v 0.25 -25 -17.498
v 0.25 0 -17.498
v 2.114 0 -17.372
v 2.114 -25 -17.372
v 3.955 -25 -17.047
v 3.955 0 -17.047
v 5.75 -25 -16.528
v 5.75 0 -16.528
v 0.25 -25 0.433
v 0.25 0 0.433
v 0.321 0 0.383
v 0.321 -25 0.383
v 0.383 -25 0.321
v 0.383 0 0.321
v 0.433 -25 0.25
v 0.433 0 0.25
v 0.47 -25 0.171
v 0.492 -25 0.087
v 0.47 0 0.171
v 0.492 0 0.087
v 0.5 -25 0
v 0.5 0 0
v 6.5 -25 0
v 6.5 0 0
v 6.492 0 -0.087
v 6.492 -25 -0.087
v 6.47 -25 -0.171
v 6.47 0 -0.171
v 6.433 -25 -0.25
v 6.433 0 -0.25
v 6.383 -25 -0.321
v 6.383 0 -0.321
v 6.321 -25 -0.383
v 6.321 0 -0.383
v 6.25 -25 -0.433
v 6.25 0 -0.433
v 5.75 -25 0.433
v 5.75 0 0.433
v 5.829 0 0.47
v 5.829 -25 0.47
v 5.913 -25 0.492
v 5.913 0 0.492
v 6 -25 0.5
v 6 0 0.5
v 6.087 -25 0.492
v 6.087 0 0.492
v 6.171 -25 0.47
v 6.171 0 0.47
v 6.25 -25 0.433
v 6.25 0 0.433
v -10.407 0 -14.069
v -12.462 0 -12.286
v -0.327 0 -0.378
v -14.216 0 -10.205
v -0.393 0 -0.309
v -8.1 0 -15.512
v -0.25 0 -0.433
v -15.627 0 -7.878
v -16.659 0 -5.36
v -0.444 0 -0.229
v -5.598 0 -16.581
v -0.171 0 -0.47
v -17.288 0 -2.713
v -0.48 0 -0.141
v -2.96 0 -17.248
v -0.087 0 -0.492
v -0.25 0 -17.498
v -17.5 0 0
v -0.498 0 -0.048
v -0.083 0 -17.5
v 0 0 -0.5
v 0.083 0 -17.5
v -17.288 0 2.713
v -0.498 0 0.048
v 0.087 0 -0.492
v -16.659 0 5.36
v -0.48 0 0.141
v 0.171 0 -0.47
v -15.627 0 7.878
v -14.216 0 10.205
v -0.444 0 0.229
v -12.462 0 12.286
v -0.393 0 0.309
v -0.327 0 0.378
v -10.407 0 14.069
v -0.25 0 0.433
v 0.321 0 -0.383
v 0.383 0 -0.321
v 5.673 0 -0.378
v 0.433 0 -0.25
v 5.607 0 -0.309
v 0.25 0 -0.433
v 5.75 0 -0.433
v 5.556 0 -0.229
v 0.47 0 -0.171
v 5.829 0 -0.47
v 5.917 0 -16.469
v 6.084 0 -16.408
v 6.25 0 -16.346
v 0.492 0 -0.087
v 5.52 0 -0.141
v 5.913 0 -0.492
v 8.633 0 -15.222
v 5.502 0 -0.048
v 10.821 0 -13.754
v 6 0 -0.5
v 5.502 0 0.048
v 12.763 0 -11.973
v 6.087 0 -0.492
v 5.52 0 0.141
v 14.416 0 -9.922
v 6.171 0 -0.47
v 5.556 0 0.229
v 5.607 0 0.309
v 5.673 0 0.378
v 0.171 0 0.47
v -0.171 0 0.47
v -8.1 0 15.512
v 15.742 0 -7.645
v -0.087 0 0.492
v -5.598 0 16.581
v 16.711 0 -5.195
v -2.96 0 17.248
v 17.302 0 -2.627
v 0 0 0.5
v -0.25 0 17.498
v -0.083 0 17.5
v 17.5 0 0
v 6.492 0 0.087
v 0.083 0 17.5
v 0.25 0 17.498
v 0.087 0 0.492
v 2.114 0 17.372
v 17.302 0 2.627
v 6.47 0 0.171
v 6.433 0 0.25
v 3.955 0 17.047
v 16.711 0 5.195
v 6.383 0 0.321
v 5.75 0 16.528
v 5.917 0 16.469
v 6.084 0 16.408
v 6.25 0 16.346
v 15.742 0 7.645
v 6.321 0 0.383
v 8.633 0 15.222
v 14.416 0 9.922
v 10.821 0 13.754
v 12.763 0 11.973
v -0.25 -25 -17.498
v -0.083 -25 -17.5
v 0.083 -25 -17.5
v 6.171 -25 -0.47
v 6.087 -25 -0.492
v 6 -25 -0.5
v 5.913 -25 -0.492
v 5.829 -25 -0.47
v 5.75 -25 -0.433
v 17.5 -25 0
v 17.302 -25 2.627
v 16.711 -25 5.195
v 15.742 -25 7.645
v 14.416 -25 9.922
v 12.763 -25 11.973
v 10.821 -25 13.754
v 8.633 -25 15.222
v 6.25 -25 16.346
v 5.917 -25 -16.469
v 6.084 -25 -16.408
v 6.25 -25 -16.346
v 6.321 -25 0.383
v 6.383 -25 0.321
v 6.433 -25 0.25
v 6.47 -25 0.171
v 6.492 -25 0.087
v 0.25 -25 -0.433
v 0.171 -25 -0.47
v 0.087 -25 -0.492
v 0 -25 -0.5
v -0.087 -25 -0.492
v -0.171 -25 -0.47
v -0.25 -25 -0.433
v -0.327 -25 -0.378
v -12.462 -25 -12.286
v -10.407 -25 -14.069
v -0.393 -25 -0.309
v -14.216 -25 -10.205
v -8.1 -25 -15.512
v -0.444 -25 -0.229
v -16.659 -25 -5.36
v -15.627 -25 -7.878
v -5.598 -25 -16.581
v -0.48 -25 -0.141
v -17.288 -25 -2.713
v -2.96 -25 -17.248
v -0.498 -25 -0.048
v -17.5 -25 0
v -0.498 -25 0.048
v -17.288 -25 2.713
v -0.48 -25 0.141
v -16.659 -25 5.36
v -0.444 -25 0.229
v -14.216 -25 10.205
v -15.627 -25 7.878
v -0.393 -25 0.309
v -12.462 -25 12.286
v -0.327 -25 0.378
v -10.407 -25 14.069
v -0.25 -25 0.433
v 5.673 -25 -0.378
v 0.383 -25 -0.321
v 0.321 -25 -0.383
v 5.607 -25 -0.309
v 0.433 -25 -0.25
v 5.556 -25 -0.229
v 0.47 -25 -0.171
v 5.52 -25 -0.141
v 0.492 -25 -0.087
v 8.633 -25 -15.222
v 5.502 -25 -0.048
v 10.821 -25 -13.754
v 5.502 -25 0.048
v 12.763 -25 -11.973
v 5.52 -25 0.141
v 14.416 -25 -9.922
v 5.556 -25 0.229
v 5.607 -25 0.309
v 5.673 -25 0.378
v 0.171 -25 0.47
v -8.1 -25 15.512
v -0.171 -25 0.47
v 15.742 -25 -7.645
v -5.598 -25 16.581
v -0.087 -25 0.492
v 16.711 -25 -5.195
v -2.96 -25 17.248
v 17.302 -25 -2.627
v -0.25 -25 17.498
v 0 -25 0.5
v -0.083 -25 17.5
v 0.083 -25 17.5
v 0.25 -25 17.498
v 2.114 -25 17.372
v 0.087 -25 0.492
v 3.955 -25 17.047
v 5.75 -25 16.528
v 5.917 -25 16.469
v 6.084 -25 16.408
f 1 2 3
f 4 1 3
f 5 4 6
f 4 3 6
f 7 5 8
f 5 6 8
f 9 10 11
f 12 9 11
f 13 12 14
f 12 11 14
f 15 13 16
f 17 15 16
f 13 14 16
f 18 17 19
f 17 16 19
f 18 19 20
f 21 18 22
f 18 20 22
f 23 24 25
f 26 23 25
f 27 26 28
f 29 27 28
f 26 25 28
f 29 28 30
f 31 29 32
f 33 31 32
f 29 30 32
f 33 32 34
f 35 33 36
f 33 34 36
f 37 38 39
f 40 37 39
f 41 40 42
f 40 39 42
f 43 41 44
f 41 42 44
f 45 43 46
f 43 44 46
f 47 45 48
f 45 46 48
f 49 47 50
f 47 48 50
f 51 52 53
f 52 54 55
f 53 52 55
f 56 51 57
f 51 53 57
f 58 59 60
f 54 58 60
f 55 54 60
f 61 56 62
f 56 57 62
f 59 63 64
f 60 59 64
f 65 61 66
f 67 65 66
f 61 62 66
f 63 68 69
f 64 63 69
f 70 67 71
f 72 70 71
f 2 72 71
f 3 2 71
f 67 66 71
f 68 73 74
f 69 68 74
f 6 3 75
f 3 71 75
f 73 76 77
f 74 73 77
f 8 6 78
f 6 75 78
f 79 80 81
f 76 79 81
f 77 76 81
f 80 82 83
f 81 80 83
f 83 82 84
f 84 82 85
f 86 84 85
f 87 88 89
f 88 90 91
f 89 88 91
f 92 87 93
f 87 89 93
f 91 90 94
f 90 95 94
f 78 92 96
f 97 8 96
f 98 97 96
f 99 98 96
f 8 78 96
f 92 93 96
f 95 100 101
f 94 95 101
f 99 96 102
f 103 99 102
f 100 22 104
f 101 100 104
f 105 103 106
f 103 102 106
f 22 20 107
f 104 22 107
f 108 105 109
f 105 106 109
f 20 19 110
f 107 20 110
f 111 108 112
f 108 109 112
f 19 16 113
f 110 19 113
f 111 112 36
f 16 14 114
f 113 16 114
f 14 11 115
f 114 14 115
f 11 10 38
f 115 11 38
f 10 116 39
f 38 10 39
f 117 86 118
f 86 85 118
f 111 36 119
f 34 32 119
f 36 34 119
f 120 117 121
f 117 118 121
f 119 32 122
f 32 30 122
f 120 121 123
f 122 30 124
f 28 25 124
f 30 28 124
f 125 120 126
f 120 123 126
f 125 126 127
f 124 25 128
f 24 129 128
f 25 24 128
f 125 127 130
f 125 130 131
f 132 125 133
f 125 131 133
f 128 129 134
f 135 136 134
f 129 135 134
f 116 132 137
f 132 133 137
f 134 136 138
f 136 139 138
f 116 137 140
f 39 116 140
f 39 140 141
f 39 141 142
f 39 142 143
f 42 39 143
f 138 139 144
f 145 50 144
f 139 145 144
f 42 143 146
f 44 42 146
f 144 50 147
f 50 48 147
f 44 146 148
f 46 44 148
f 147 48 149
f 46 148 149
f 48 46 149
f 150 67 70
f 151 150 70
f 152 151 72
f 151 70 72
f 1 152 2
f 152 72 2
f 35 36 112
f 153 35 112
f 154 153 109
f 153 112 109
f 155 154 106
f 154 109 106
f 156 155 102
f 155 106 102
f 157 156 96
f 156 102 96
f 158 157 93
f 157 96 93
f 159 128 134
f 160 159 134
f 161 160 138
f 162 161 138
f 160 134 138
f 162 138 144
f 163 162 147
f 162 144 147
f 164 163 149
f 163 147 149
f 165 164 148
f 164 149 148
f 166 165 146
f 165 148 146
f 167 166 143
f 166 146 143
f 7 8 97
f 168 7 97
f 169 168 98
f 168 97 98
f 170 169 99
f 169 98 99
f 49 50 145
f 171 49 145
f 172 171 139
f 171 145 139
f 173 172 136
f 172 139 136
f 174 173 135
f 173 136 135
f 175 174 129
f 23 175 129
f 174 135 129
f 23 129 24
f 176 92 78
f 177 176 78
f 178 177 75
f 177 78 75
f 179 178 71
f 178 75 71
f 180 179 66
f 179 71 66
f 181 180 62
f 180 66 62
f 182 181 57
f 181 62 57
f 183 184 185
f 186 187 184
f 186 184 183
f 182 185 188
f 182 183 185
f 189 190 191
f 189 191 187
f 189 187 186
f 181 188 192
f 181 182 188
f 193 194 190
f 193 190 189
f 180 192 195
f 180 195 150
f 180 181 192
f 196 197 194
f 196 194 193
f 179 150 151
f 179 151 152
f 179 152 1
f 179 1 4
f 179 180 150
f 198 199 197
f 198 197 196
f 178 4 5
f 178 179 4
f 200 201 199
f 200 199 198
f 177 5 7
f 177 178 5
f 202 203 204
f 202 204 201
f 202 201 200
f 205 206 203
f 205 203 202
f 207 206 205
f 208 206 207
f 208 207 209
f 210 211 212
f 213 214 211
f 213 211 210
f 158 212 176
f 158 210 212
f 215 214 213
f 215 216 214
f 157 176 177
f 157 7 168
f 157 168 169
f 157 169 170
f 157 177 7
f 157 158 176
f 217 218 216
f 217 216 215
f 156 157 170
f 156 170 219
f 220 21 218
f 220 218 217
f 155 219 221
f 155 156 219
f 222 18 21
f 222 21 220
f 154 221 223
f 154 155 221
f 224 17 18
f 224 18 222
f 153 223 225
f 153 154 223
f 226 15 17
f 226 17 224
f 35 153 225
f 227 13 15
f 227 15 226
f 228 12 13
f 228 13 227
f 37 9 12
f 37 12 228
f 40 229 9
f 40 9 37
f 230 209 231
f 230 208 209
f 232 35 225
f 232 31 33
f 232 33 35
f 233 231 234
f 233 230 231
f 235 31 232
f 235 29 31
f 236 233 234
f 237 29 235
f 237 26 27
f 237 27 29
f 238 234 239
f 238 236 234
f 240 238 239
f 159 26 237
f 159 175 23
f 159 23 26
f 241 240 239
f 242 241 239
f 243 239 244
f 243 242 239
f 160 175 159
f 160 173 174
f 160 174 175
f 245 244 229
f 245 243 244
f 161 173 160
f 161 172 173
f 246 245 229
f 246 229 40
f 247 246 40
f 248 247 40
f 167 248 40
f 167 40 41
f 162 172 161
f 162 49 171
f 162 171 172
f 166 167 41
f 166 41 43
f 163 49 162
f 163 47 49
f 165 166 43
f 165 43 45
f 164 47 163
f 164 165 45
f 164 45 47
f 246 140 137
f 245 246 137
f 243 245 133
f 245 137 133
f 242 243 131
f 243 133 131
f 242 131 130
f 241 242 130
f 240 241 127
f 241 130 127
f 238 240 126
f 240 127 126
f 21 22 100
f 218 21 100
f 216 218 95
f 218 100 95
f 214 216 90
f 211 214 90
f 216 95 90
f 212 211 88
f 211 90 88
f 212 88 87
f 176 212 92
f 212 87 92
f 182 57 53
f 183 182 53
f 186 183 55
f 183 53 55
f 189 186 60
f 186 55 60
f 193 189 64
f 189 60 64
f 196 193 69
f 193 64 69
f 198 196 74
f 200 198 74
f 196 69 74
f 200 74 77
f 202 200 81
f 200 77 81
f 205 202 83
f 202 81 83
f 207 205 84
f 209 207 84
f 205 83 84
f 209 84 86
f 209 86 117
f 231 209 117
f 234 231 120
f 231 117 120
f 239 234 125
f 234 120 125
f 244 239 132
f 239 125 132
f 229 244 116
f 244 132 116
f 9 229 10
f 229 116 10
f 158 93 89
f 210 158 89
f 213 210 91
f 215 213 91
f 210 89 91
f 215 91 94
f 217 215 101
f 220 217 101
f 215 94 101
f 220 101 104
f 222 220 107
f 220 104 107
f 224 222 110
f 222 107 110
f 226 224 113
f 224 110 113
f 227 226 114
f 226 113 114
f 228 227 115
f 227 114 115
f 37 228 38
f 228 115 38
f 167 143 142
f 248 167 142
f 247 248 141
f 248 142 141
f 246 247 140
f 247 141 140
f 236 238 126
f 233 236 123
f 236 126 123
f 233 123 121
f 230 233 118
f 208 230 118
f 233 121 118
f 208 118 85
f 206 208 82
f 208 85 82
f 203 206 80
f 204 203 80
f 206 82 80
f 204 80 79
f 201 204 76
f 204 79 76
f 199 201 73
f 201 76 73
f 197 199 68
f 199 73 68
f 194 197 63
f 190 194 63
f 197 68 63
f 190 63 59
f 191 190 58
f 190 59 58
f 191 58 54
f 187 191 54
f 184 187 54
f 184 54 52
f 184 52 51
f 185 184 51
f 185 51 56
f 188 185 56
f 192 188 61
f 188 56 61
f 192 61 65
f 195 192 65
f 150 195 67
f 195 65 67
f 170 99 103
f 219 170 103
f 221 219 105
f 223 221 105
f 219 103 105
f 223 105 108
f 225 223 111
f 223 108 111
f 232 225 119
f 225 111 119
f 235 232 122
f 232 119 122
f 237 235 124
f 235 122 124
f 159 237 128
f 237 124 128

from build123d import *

# Parameters (mm, degrees)
F1_DEPTH = 25


with BuildPart() as f1:
    # F0 (on Front) → F1 (new body)
    with BuildSketch(Plane.XZ):
        with BuildLine():
            Line((-0.25, 0.4330127019), (-0.25, 17.4982141946))
            ThreePointArc((-0.25, 17.4982141946), (-17.5, 0), (-0.25, -17.4982141946))
            Line((-0.25, -17.4982141946), (-0.25, -0.4330127019))
            ThreePointArc((-0.25, -0.4330127019), (-0.5, 0), (-0.25, 0.4330127019))
        make_face()
        with BuildLine():
            Line((5.75, 0.4330127019), (5.75, 16.5283846761))
            ThreePointArc((5.75, 16.5283846761), (3.0389376966, 17.2341189991), (0.25, 17.4982141946))
            Line((0.25, 17.4982141946), (0.25, 0.4330127019))
            ThreePointArc((0.25, 0.4330127019), (0.4330127019, 0.25), (0.5, 0))
            ThreePointArc((0.5, 0), (0.4330127019, -0.25), (0.25, -0.4330127019))
            Line((0.25, -0.4330127019), (0.25, -17.4982141946))
            ThreePointArc((0.25, -17.4982141946), (3.0389376966, -17.2341189991), (5.75, -16.5283846761))
            Line((5.75, -16.5283846761), (5.75, -0.4330127019))
            ThreePointArc((5.75, -0.4330127019), (5.5, 0), (5.75, 0.4330127019))
        make_face()
        with BuildLine():
            Line((0.25, 0.4330127019), (0.25, 17.4982141946))
            ThreePointArc((0.25, 17.4982141946), (0, 17.5), (-0.25, 17.4982141946))
            Line((-0.25, 17.4982141946), (-0.25, 0.4330127019))
            ThreePointArc((-0.25, 0.4330127019), (0, 0.5), (0.25, 0.4330127019))
        make_face()
        with BuildLine():
            ThreePointArc((-0.25, -17.4982141946), (0, -17.5), (0.25, -17.4982141946))
            Line((0.25, -17.4982141946), (0.25, -0.4330127019))
            ThreePointArc((0.25, -0.4330127019), (0, -0.5), (-0.25, -0.4330127019))
            Line((-0.25, -0.4330127019), (-0.25, -17.4982141946))
        make_face()
        with BuildLine():
            ThreePointArc((5.75, -16.5283846761), (6.0006939438, -16.439028931), (6.25, -16.3458710383))
            Line((6.25, -16.3458710383), (6.25, -0.4330127019))
            ThreePointArc((6.25, -0.4330127019), (6, -0.5), (5.75, -0.4330127019))
            Line((5.75, -0.4330127019), (5.75, -16.5283846761))
        make_face()
        with BuildLine():
            Line((6.25, 0.4330127019), (6.25, 16.3458710383))
            ThreePointArc((6.25, 16.3458710383), (6.0006939438, 16.439028931), (5.75, 16.5283846761))
            Line((5.75, 16.5283846761), (5.75, 0.4330127019))
            ThreePointArc((5.75, 0.4330127019), (6, 0.5), (6.25, 0.4330127019))
        make_face()
        with BuildLine():
            ThreePointArc((6.25, -16.3458710383), (14.4157032433, -9.9215674165), (17.5, 0))
            ThreePointArc((17.5, 0), (14.4157032433, 9.9215674165), (6.25, 16.3458710383))
            Line((6.25, 16.3458710383), (6.25, 0.4330127019))
            ThreePointArc((6.25, 0.4330127019), (6.4330127019, 0.25), (6.5, 0))
            ThreePointArc((6.5, 0), (6.4330127019, -0.25), (6.25, -0.4330127019))
            Line((6.25, -0.4330127019), (6.25, -16.3458710383))
        make_face()
    extrude(amount=F1_DEPTH)


solid = f1.part
